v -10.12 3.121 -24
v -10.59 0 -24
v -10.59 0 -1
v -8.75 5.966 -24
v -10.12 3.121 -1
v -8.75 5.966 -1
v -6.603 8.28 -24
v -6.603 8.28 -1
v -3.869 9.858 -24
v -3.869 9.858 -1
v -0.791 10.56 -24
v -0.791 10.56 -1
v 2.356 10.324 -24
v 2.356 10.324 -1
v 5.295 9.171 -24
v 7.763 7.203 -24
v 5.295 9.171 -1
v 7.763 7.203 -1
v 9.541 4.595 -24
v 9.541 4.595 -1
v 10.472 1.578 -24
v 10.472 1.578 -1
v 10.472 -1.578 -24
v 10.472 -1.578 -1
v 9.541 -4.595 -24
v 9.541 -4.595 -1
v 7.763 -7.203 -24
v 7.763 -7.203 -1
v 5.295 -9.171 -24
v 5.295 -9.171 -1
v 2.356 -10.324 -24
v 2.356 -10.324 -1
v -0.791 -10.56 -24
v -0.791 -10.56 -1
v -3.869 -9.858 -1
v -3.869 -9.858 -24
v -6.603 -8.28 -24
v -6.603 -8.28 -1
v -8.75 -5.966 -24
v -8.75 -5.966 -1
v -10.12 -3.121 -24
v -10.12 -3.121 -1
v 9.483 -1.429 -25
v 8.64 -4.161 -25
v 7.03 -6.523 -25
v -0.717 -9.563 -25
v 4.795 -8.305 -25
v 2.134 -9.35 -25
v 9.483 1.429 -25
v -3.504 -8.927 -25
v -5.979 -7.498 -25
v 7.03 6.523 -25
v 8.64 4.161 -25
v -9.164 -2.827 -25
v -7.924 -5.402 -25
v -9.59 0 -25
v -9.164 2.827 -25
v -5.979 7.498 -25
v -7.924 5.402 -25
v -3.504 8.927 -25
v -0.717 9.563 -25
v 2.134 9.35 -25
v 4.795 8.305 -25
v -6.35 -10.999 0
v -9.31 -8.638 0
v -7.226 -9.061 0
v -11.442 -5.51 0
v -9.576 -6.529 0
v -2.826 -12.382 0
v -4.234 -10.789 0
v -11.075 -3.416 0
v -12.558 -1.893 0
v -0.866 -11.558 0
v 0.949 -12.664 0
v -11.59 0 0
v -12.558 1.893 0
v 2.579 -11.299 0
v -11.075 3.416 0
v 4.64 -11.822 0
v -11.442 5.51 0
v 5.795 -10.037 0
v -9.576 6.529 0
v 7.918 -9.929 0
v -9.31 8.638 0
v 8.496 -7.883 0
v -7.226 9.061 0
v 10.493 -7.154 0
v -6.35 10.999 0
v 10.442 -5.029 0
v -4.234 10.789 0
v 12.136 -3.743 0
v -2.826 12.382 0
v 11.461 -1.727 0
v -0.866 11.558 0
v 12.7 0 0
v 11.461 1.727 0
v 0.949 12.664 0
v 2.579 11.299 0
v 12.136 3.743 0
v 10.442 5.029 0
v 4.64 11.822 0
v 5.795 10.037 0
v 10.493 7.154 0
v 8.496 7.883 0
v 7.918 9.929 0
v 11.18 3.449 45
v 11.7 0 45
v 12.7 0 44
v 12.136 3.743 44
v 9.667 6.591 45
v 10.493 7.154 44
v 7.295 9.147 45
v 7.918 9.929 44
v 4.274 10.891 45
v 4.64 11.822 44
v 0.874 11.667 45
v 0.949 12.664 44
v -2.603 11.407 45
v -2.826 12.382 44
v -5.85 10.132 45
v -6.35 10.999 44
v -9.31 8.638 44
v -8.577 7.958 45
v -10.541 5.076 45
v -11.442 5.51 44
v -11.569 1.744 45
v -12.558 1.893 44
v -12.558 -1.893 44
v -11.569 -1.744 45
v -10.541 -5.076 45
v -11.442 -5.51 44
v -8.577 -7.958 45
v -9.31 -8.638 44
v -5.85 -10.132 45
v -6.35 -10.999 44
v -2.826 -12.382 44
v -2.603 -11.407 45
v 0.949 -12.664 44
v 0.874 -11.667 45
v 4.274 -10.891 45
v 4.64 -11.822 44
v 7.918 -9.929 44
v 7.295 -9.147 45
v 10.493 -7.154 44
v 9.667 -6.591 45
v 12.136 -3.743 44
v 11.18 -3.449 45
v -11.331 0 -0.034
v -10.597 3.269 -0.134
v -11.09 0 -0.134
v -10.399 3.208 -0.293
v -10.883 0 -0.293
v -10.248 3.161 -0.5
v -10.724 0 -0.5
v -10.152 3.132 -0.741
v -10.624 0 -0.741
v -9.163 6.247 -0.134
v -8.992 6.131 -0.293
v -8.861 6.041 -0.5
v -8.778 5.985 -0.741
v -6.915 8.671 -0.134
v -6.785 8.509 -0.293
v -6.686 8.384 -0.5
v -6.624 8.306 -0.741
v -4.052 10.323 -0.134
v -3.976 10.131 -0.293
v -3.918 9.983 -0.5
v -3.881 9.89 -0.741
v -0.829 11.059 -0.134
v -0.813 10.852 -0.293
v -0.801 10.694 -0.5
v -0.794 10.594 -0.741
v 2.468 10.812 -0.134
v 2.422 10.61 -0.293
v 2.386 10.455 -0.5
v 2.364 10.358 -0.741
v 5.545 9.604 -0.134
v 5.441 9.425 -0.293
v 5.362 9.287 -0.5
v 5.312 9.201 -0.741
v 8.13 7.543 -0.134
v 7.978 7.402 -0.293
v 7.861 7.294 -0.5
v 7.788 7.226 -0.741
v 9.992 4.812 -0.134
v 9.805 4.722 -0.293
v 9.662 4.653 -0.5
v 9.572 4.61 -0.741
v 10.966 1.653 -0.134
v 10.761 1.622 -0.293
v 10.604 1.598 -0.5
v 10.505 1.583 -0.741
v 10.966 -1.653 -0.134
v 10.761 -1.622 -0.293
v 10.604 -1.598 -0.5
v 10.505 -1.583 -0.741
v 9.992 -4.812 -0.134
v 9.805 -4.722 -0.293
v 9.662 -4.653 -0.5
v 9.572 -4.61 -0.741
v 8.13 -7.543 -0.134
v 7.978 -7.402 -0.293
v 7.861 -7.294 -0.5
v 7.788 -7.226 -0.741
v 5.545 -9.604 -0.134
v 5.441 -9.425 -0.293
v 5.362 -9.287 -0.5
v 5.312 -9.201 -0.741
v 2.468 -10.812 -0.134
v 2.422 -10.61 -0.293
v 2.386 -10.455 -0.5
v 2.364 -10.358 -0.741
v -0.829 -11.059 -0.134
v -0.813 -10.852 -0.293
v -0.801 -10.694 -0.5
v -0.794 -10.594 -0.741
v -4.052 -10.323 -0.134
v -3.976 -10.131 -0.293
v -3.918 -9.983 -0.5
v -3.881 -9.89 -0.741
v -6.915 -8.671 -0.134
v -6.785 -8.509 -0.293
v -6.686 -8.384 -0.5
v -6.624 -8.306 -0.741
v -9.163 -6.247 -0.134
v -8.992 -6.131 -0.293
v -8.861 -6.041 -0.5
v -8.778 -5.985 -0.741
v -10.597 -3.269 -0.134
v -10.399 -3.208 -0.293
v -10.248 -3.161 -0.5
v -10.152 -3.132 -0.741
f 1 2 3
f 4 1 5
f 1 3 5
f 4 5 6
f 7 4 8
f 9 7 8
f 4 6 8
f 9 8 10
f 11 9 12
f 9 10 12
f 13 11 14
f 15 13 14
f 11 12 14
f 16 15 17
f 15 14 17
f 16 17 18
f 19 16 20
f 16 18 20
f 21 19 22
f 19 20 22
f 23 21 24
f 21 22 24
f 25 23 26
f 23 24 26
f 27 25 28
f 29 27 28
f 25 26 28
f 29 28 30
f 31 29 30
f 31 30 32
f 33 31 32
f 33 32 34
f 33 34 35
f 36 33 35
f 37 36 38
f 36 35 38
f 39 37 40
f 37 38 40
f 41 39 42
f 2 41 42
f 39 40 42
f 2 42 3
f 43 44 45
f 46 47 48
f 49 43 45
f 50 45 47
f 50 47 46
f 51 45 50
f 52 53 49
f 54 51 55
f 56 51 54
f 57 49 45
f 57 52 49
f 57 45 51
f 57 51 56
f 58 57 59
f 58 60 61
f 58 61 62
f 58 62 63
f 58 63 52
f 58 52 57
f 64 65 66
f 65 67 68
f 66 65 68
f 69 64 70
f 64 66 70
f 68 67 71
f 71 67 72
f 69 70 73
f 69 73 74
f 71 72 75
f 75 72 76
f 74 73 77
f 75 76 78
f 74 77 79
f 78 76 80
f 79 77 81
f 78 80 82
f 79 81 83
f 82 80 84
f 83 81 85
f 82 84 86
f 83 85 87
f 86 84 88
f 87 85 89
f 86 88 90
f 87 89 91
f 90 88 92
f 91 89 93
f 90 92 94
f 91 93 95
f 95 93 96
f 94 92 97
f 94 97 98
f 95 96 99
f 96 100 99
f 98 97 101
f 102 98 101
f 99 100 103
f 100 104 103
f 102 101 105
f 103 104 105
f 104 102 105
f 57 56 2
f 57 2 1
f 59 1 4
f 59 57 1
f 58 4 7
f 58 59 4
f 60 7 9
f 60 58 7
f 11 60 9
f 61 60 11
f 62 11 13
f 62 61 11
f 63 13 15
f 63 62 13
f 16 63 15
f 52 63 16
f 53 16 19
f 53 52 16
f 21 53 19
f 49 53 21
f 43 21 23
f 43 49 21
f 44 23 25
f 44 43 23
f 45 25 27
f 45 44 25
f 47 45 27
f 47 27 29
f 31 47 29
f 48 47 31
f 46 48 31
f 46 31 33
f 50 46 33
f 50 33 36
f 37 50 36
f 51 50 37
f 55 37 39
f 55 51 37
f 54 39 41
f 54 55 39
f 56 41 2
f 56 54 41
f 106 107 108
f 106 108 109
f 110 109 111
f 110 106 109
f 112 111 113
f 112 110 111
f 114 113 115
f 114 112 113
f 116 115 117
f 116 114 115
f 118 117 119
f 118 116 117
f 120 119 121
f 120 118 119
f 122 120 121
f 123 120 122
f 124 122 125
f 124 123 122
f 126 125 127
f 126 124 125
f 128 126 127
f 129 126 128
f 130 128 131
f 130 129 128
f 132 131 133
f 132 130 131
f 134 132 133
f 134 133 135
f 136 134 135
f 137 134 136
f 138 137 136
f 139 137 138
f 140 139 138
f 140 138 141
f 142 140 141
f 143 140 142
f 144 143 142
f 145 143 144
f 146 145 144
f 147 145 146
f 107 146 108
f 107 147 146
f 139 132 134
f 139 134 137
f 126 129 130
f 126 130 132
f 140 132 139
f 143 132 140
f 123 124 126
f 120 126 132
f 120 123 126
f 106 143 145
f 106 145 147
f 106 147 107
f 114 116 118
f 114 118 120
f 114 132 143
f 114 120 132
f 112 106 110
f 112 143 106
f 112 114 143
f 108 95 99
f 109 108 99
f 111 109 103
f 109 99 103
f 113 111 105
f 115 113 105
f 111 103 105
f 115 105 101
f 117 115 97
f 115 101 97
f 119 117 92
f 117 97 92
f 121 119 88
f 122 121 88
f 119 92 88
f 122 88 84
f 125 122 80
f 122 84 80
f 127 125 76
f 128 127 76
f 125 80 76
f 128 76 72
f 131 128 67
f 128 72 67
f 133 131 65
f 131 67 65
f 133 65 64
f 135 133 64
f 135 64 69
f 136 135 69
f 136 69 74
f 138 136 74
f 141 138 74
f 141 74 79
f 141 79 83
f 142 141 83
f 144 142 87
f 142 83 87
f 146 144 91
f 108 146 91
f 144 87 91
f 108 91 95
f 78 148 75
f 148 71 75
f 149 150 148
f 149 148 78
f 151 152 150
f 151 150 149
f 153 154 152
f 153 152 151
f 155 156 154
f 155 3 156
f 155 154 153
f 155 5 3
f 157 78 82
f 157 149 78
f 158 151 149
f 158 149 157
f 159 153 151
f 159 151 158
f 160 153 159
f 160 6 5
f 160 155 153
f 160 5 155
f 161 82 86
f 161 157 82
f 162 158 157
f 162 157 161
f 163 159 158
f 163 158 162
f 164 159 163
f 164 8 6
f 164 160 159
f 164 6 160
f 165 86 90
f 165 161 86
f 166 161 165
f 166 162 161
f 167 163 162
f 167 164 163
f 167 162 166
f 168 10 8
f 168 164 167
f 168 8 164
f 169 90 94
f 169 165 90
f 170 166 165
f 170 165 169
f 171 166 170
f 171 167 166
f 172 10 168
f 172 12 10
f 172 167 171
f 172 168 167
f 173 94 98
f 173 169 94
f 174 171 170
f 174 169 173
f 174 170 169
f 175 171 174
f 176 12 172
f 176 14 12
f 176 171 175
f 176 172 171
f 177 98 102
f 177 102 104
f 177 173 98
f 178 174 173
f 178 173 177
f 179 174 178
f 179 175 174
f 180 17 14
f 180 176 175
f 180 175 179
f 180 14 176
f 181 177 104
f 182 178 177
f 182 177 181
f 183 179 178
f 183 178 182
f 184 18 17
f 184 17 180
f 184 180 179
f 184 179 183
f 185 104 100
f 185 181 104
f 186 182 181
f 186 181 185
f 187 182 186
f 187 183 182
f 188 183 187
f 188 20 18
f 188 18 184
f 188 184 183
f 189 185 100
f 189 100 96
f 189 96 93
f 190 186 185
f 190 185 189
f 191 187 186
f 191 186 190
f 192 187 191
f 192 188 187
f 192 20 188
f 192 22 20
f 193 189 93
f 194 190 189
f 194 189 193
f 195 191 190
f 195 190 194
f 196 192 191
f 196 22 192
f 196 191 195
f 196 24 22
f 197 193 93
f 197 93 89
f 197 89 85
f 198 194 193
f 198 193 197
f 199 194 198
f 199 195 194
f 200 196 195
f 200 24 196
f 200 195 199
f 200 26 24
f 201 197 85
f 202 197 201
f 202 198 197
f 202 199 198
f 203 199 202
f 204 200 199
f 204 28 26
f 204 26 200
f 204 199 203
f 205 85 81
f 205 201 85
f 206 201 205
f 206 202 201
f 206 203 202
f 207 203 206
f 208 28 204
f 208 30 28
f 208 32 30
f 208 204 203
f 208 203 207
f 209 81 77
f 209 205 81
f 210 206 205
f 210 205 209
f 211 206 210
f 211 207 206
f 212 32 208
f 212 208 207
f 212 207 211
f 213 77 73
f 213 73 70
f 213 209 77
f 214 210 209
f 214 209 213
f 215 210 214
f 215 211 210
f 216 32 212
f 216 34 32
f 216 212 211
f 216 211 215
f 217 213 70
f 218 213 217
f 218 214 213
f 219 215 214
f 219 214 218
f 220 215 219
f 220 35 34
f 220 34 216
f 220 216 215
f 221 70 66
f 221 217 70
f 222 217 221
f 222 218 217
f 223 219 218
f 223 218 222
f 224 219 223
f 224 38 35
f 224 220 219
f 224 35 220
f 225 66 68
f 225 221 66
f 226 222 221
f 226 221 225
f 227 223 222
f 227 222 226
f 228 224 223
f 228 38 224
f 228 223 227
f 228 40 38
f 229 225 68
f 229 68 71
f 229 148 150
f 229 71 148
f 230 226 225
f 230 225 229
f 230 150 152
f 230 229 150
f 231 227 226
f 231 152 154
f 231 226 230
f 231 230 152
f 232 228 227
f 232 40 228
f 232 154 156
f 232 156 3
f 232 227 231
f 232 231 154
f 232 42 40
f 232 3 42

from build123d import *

# Parameters (mm, degrees)
SKETCH1_R           = 12.7
BOSS_EXTRUDE1_DEPTH = 45
SKETCH2_R           = 10.59
BOSS_EXTRUDE2_DEPTH = 25
FILLET1_R           = 1
CHAMFER2_SIZE       = 1
CHAMFER3_SIZE       = 1


with BuildPart() as part:
    # Sketch1 → Boss-Extrude1 (new body)
    with BuildSketch(Plane.XY):
        Circle(SKETCH1_R)
    extrude(amount=BOSS_EXTRUDE1_DEPTH)

    # Sketch2 → Boss-Extrude2 (add)
    with BuildSketch(Plane(origin=(0, 0, 0), x_dir=(-1, 0, 0), z_dir=(0, 0, -1))):
        Circle(SKETCH2_R)
    extrude(amount=BOSS_EXTRUDE2_DEPTH)

    # Fillet1
    fillet1_edges = [part.edges().sort_by_distance(p)[0] for p in [
        (10.59, 0, 0),
    ]]
    fillet(fillet1_edges, radius=FILLET1_R)

    # Chamfer2
    chamfer2_edges = [part.edges().sort_by_distance(p)[0] for p in [
        (10.59, 0, -25),
    ]]
    chamfer(chamfer2_edges, length=CHAMFER2_SIZE)

    # Chamfer3
    chamfer3_edges = [part.edges().sort_by_distance(p)[0] for p in [
        (-12.7, 0, 45),
    ]]
    chamfer(chamfer3_edges, length=CHAMFER3_SIZE)


solid = part.part
